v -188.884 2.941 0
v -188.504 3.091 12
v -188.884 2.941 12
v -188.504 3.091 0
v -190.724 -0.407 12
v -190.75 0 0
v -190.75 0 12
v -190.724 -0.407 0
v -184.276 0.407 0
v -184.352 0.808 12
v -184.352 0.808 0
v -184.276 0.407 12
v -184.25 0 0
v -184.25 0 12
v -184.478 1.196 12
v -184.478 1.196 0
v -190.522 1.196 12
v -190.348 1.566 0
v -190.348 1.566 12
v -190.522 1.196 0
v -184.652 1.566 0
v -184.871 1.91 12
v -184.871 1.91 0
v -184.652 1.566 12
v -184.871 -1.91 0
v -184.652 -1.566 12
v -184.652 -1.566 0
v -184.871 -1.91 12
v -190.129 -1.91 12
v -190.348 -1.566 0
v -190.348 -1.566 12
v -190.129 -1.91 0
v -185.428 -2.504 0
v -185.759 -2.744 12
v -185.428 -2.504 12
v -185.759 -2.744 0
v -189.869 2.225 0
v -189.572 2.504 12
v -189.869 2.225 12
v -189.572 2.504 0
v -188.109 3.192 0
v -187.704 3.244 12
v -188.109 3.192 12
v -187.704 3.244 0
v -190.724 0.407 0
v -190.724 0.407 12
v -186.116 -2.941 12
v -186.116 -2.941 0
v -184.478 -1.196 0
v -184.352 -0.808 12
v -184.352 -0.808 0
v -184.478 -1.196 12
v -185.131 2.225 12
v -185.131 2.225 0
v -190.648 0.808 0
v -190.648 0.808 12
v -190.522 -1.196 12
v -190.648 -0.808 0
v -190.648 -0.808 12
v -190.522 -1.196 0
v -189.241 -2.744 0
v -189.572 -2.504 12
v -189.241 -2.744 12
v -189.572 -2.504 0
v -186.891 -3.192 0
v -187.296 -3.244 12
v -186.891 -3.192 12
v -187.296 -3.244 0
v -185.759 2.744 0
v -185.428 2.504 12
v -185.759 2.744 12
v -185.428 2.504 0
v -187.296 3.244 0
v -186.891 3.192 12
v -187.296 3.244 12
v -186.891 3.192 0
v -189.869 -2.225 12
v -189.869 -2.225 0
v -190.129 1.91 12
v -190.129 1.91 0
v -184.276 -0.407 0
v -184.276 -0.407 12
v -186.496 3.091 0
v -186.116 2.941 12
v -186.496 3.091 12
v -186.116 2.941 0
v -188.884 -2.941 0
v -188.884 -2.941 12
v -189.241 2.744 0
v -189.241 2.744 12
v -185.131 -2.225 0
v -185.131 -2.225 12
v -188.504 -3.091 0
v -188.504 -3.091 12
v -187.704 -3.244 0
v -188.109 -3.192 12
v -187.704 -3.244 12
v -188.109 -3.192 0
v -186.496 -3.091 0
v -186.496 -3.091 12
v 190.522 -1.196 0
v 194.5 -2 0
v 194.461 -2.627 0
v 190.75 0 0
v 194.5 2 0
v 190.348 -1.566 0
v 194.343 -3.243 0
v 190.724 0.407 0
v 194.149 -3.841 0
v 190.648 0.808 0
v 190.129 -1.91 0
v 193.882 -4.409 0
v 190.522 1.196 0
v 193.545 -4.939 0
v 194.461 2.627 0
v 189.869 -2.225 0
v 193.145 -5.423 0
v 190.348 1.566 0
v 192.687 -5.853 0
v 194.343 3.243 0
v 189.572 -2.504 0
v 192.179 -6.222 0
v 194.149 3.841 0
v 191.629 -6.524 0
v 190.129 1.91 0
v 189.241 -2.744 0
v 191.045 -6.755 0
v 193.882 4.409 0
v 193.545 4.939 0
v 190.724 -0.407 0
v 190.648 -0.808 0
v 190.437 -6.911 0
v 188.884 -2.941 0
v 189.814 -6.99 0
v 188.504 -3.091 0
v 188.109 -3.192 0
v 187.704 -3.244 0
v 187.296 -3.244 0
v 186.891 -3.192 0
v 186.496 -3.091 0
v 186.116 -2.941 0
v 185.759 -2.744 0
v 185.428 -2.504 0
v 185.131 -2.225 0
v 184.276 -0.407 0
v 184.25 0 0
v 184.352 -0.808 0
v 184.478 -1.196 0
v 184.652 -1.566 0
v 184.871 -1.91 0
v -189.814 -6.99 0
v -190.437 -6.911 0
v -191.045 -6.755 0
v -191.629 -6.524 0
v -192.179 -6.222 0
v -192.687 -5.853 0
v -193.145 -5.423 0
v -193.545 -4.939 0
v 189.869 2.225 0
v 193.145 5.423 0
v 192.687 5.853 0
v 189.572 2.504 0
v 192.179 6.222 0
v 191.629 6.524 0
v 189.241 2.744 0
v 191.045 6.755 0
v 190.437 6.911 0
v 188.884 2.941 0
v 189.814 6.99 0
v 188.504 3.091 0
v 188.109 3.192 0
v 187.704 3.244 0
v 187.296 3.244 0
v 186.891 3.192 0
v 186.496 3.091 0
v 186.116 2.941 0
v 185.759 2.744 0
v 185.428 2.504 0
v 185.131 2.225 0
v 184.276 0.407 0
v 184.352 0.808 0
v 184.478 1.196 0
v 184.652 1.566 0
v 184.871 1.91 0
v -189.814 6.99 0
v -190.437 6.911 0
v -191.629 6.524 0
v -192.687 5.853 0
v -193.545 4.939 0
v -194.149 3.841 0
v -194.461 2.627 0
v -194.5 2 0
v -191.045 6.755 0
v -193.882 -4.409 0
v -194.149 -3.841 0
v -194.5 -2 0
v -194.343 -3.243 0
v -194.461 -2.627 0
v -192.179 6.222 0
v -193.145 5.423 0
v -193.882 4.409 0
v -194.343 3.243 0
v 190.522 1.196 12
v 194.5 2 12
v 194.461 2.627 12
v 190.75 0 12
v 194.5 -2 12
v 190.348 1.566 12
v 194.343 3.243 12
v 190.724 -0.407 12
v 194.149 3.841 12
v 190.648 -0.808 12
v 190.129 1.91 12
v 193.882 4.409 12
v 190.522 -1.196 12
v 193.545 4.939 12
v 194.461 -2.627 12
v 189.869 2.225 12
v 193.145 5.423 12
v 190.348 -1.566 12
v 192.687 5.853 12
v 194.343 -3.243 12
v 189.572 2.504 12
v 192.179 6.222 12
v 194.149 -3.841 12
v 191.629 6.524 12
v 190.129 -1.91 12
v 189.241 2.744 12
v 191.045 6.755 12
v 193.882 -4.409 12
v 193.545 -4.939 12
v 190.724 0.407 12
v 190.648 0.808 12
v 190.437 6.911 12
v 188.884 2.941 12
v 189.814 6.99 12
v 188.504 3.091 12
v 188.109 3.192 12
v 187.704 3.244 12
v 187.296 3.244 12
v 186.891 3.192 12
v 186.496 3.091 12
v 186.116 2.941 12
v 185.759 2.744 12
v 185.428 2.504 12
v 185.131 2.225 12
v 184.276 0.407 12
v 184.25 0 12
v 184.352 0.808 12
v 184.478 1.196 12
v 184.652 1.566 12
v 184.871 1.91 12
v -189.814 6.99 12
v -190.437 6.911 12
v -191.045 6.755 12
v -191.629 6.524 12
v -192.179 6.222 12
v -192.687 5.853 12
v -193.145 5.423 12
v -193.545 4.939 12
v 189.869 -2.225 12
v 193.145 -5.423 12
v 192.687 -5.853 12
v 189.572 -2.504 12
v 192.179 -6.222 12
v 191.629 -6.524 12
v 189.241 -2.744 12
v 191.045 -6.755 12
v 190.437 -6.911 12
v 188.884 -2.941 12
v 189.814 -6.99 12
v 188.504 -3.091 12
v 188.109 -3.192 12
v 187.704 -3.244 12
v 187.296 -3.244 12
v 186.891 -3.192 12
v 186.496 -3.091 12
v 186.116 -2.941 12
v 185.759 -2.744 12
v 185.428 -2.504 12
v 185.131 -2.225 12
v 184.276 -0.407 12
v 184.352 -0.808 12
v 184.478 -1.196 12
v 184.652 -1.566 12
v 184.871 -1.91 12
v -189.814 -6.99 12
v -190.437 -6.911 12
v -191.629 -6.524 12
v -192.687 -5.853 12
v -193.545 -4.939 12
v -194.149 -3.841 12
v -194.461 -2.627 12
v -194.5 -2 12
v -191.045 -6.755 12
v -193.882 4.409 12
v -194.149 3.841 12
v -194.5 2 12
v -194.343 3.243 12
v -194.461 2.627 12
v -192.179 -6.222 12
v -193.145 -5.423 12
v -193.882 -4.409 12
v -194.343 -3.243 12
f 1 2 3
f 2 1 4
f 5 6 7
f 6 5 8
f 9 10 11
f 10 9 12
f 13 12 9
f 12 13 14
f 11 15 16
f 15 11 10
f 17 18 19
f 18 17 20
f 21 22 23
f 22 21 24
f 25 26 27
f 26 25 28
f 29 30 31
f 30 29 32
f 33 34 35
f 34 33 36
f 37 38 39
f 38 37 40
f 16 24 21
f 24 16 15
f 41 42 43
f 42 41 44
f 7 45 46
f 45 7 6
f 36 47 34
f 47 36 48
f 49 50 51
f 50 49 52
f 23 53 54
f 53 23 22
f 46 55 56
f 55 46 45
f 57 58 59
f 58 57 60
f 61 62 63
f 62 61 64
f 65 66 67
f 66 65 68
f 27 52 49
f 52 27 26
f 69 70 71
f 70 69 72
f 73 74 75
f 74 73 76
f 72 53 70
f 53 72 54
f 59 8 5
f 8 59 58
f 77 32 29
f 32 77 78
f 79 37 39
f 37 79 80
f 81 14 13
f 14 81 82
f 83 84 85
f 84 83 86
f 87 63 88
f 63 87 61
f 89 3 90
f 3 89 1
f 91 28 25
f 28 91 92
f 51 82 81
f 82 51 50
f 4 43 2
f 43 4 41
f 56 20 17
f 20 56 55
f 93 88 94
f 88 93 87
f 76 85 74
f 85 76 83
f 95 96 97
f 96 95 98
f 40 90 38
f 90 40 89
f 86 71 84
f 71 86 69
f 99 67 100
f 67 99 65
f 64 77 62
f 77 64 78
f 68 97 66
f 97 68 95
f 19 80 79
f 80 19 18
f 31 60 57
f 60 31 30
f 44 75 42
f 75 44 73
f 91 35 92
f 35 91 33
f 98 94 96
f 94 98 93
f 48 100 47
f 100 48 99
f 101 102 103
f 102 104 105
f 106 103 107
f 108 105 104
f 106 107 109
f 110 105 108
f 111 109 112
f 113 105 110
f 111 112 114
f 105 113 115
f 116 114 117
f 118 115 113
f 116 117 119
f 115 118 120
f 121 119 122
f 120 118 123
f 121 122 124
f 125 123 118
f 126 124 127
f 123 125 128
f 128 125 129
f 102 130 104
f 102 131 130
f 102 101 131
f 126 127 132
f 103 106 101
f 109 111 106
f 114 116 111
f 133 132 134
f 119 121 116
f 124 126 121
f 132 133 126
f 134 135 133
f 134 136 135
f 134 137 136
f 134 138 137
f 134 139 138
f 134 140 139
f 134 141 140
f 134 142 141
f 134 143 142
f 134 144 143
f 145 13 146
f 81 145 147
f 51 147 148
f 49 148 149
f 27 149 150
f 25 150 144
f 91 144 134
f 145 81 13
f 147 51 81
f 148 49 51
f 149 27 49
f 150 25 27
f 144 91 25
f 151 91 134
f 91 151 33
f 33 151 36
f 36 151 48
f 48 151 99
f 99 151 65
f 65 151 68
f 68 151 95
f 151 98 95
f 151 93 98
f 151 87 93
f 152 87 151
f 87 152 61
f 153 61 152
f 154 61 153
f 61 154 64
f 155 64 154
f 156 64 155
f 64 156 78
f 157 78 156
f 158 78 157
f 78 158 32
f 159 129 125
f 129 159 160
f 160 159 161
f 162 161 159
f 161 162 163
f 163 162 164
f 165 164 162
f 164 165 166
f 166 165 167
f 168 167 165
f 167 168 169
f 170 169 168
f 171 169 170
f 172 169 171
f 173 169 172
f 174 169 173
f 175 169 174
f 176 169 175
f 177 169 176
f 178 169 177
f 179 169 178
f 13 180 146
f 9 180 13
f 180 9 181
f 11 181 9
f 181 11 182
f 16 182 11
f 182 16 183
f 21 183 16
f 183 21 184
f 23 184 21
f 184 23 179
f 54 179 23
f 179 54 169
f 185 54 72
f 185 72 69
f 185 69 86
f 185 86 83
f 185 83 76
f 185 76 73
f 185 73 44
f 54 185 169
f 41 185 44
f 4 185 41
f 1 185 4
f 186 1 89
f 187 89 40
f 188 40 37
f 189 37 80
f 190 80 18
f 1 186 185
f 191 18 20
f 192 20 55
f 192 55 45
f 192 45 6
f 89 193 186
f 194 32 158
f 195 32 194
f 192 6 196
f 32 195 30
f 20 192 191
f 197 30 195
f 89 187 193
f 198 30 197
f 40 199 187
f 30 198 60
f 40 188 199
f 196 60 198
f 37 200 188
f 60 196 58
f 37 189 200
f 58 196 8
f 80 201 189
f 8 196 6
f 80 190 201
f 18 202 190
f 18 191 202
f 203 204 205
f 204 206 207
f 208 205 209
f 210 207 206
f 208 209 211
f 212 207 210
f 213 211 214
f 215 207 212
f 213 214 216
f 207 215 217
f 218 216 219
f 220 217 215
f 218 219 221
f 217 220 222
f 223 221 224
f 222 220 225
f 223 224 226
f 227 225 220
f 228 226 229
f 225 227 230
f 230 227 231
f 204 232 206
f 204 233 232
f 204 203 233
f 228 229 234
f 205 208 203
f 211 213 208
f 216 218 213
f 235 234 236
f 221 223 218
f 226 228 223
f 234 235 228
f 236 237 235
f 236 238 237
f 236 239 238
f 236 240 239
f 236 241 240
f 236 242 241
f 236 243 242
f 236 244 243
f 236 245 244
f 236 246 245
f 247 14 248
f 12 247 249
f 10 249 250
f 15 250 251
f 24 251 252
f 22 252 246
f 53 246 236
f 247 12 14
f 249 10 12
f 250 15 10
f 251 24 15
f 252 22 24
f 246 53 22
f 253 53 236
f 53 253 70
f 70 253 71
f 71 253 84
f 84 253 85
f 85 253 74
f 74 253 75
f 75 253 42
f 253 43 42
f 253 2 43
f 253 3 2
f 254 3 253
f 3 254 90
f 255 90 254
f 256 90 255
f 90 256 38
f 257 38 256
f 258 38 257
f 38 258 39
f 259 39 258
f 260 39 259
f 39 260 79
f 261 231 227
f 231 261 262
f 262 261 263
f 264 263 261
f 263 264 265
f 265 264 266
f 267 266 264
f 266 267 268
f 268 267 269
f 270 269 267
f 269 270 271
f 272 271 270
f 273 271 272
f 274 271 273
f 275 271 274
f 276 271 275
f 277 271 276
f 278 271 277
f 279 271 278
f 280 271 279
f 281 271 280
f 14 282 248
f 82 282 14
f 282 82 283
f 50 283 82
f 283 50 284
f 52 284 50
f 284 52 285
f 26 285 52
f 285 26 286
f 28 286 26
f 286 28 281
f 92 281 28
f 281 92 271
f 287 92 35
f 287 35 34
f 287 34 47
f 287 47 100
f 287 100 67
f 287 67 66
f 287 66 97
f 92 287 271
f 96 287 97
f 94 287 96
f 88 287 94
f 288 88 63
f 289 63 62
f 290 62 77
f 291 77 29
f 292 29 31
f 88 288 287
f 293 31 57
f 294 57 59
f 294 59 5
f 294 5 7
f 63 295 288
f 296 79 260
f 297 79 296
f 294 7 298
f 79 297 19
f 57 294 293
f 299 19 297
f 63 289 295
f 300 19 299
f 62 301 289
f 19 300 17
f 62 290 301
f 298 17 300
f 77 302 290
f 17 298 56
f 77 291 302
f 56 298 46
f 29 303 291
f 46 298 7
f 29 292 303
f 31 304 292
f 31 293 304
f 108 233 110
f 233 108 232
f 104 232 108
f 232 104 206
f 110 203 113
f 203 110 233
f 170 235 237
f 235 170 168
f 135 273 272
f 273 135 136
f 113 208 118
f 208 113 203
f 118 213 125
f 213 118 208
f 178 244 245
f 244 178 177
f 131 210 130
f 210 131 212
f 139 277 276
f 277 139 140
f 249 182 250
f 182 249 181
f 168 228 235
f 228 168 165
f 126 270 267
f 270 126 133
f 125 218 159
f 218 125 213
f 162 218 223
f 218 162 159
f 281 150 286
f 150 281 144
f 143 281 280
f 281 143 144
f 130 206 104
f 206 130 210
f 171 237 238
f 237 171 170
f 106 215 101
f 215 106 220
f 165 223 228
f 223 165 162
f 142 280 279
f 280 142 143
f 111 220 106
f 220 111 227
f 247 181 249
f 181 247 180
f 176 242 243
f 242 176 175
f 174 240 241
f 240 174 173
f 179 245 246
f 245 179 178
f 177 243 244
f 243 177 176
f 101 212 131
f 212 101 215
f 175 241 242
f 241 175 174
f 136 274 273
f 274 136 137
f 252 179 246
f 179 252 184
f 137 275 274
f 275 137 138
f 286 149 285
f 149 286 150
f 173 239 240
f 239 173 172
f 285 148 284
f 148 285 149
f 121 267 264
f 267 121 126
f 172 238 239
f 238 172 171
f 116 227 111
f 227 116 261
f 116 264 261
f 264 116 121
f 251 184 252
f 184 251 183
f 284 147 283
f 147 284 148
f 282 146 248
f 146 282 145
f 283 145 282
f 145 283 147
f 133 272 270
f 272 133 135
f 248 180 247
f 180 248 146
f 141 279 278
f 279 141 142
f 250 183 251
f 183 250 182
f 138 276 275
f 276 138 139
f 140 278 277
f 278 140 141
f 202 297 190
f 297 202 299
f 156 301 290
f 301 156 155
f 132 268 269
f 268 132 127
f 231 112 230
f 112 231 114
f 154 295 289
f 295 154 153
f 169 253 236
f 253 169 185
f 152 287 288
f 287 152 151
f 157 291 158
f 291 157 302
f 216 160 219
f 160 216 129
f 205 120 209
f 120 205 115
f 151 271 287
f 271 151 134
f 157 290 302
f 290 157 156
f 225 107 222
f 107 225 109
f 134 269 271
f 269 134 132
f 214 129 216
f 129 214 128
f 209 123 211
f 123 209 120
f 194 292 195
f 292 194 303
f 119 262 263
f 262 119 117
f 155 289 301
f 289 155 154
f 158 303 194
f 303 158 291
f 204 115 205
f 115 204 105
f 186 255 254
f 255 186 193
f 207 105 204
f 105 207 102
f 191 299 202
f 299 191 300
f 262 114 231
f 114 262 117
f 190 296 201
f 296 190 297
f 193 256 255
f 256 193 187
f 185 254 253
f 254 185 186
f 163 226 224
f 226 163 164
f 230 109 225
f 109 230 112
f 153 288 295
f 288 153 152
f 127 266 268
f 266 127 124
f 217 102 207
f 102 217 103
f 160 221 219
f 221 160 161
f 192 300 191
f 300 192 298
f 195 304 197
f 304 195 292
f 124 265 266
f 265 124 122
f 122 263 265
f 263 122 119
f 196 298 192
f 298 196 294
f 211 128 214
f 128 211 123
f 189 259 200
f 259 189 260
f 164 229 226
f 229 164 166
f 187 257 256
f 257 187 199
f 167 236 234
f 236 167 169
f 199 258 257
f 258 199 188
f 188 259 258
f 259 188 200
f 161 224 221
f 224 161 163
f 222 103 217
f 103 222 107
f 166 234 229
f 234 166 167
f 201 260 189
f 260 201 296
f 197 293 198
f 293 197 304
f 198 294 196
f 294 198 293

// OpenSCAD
$fn = 50;


difference() {
	union() {
		hull() {
			translate(v = [-189.5000000000, 2.0000000000, 0]) {
				cylinder(h = 12, r = 5);
			}
			translate(v = [189.5000000000, 2.0000000000, 0]) {
				cylinder(h = 12, r = 5);
			}
			translate(v = [-189.5000000000, -2.0000000000, 0]) {
				cylinder(h = 12, r = 5);
			}
			translate(v = [189.5000000000, -2.0000000000, 0]) {
				cylinder(h = 12, r = 5);
			}
		}
	}
	union() {
		translate(v = [-187.5000000000, 0.0000000000, 0]) {
			cylinder(h = 12, r = 3.2500000000);
		}
		translate(v = [187.5000000000, 0.0000000000, 0]) {
			cylinder(h = 12, r = 3.2500000000);
		}
		translate(v = [-187.5000000000, 0.0000000000, 0]) {
			cylinder(h = 12, r = 1.8000000000);
		}
		translate(v = [187.5000000000, 0.0000000000, 0]) {
			cylinder(h = 12, r = 1.8000000000);
		}
		translate(v = [-187.5000000000, 0.0000000000, 0]) {
			cylinder(h = 12, r = 1.8000000000);
		}
		translate(v = [187.5000000000, 0.0000000000, 0]) {
			cylinder(h = 12, r = 1.8000000000);
		}
		translate(v = [-187.5000000000, 0.0000000000, 0]) {
			cylinder(h = 12, r = 1.8000000000);
		}
		translate(v = [187.5000000000, 0.0000000000, 0]) {
			cylinder(h = 12, r = 1.8000000000);
		}
	}
}
